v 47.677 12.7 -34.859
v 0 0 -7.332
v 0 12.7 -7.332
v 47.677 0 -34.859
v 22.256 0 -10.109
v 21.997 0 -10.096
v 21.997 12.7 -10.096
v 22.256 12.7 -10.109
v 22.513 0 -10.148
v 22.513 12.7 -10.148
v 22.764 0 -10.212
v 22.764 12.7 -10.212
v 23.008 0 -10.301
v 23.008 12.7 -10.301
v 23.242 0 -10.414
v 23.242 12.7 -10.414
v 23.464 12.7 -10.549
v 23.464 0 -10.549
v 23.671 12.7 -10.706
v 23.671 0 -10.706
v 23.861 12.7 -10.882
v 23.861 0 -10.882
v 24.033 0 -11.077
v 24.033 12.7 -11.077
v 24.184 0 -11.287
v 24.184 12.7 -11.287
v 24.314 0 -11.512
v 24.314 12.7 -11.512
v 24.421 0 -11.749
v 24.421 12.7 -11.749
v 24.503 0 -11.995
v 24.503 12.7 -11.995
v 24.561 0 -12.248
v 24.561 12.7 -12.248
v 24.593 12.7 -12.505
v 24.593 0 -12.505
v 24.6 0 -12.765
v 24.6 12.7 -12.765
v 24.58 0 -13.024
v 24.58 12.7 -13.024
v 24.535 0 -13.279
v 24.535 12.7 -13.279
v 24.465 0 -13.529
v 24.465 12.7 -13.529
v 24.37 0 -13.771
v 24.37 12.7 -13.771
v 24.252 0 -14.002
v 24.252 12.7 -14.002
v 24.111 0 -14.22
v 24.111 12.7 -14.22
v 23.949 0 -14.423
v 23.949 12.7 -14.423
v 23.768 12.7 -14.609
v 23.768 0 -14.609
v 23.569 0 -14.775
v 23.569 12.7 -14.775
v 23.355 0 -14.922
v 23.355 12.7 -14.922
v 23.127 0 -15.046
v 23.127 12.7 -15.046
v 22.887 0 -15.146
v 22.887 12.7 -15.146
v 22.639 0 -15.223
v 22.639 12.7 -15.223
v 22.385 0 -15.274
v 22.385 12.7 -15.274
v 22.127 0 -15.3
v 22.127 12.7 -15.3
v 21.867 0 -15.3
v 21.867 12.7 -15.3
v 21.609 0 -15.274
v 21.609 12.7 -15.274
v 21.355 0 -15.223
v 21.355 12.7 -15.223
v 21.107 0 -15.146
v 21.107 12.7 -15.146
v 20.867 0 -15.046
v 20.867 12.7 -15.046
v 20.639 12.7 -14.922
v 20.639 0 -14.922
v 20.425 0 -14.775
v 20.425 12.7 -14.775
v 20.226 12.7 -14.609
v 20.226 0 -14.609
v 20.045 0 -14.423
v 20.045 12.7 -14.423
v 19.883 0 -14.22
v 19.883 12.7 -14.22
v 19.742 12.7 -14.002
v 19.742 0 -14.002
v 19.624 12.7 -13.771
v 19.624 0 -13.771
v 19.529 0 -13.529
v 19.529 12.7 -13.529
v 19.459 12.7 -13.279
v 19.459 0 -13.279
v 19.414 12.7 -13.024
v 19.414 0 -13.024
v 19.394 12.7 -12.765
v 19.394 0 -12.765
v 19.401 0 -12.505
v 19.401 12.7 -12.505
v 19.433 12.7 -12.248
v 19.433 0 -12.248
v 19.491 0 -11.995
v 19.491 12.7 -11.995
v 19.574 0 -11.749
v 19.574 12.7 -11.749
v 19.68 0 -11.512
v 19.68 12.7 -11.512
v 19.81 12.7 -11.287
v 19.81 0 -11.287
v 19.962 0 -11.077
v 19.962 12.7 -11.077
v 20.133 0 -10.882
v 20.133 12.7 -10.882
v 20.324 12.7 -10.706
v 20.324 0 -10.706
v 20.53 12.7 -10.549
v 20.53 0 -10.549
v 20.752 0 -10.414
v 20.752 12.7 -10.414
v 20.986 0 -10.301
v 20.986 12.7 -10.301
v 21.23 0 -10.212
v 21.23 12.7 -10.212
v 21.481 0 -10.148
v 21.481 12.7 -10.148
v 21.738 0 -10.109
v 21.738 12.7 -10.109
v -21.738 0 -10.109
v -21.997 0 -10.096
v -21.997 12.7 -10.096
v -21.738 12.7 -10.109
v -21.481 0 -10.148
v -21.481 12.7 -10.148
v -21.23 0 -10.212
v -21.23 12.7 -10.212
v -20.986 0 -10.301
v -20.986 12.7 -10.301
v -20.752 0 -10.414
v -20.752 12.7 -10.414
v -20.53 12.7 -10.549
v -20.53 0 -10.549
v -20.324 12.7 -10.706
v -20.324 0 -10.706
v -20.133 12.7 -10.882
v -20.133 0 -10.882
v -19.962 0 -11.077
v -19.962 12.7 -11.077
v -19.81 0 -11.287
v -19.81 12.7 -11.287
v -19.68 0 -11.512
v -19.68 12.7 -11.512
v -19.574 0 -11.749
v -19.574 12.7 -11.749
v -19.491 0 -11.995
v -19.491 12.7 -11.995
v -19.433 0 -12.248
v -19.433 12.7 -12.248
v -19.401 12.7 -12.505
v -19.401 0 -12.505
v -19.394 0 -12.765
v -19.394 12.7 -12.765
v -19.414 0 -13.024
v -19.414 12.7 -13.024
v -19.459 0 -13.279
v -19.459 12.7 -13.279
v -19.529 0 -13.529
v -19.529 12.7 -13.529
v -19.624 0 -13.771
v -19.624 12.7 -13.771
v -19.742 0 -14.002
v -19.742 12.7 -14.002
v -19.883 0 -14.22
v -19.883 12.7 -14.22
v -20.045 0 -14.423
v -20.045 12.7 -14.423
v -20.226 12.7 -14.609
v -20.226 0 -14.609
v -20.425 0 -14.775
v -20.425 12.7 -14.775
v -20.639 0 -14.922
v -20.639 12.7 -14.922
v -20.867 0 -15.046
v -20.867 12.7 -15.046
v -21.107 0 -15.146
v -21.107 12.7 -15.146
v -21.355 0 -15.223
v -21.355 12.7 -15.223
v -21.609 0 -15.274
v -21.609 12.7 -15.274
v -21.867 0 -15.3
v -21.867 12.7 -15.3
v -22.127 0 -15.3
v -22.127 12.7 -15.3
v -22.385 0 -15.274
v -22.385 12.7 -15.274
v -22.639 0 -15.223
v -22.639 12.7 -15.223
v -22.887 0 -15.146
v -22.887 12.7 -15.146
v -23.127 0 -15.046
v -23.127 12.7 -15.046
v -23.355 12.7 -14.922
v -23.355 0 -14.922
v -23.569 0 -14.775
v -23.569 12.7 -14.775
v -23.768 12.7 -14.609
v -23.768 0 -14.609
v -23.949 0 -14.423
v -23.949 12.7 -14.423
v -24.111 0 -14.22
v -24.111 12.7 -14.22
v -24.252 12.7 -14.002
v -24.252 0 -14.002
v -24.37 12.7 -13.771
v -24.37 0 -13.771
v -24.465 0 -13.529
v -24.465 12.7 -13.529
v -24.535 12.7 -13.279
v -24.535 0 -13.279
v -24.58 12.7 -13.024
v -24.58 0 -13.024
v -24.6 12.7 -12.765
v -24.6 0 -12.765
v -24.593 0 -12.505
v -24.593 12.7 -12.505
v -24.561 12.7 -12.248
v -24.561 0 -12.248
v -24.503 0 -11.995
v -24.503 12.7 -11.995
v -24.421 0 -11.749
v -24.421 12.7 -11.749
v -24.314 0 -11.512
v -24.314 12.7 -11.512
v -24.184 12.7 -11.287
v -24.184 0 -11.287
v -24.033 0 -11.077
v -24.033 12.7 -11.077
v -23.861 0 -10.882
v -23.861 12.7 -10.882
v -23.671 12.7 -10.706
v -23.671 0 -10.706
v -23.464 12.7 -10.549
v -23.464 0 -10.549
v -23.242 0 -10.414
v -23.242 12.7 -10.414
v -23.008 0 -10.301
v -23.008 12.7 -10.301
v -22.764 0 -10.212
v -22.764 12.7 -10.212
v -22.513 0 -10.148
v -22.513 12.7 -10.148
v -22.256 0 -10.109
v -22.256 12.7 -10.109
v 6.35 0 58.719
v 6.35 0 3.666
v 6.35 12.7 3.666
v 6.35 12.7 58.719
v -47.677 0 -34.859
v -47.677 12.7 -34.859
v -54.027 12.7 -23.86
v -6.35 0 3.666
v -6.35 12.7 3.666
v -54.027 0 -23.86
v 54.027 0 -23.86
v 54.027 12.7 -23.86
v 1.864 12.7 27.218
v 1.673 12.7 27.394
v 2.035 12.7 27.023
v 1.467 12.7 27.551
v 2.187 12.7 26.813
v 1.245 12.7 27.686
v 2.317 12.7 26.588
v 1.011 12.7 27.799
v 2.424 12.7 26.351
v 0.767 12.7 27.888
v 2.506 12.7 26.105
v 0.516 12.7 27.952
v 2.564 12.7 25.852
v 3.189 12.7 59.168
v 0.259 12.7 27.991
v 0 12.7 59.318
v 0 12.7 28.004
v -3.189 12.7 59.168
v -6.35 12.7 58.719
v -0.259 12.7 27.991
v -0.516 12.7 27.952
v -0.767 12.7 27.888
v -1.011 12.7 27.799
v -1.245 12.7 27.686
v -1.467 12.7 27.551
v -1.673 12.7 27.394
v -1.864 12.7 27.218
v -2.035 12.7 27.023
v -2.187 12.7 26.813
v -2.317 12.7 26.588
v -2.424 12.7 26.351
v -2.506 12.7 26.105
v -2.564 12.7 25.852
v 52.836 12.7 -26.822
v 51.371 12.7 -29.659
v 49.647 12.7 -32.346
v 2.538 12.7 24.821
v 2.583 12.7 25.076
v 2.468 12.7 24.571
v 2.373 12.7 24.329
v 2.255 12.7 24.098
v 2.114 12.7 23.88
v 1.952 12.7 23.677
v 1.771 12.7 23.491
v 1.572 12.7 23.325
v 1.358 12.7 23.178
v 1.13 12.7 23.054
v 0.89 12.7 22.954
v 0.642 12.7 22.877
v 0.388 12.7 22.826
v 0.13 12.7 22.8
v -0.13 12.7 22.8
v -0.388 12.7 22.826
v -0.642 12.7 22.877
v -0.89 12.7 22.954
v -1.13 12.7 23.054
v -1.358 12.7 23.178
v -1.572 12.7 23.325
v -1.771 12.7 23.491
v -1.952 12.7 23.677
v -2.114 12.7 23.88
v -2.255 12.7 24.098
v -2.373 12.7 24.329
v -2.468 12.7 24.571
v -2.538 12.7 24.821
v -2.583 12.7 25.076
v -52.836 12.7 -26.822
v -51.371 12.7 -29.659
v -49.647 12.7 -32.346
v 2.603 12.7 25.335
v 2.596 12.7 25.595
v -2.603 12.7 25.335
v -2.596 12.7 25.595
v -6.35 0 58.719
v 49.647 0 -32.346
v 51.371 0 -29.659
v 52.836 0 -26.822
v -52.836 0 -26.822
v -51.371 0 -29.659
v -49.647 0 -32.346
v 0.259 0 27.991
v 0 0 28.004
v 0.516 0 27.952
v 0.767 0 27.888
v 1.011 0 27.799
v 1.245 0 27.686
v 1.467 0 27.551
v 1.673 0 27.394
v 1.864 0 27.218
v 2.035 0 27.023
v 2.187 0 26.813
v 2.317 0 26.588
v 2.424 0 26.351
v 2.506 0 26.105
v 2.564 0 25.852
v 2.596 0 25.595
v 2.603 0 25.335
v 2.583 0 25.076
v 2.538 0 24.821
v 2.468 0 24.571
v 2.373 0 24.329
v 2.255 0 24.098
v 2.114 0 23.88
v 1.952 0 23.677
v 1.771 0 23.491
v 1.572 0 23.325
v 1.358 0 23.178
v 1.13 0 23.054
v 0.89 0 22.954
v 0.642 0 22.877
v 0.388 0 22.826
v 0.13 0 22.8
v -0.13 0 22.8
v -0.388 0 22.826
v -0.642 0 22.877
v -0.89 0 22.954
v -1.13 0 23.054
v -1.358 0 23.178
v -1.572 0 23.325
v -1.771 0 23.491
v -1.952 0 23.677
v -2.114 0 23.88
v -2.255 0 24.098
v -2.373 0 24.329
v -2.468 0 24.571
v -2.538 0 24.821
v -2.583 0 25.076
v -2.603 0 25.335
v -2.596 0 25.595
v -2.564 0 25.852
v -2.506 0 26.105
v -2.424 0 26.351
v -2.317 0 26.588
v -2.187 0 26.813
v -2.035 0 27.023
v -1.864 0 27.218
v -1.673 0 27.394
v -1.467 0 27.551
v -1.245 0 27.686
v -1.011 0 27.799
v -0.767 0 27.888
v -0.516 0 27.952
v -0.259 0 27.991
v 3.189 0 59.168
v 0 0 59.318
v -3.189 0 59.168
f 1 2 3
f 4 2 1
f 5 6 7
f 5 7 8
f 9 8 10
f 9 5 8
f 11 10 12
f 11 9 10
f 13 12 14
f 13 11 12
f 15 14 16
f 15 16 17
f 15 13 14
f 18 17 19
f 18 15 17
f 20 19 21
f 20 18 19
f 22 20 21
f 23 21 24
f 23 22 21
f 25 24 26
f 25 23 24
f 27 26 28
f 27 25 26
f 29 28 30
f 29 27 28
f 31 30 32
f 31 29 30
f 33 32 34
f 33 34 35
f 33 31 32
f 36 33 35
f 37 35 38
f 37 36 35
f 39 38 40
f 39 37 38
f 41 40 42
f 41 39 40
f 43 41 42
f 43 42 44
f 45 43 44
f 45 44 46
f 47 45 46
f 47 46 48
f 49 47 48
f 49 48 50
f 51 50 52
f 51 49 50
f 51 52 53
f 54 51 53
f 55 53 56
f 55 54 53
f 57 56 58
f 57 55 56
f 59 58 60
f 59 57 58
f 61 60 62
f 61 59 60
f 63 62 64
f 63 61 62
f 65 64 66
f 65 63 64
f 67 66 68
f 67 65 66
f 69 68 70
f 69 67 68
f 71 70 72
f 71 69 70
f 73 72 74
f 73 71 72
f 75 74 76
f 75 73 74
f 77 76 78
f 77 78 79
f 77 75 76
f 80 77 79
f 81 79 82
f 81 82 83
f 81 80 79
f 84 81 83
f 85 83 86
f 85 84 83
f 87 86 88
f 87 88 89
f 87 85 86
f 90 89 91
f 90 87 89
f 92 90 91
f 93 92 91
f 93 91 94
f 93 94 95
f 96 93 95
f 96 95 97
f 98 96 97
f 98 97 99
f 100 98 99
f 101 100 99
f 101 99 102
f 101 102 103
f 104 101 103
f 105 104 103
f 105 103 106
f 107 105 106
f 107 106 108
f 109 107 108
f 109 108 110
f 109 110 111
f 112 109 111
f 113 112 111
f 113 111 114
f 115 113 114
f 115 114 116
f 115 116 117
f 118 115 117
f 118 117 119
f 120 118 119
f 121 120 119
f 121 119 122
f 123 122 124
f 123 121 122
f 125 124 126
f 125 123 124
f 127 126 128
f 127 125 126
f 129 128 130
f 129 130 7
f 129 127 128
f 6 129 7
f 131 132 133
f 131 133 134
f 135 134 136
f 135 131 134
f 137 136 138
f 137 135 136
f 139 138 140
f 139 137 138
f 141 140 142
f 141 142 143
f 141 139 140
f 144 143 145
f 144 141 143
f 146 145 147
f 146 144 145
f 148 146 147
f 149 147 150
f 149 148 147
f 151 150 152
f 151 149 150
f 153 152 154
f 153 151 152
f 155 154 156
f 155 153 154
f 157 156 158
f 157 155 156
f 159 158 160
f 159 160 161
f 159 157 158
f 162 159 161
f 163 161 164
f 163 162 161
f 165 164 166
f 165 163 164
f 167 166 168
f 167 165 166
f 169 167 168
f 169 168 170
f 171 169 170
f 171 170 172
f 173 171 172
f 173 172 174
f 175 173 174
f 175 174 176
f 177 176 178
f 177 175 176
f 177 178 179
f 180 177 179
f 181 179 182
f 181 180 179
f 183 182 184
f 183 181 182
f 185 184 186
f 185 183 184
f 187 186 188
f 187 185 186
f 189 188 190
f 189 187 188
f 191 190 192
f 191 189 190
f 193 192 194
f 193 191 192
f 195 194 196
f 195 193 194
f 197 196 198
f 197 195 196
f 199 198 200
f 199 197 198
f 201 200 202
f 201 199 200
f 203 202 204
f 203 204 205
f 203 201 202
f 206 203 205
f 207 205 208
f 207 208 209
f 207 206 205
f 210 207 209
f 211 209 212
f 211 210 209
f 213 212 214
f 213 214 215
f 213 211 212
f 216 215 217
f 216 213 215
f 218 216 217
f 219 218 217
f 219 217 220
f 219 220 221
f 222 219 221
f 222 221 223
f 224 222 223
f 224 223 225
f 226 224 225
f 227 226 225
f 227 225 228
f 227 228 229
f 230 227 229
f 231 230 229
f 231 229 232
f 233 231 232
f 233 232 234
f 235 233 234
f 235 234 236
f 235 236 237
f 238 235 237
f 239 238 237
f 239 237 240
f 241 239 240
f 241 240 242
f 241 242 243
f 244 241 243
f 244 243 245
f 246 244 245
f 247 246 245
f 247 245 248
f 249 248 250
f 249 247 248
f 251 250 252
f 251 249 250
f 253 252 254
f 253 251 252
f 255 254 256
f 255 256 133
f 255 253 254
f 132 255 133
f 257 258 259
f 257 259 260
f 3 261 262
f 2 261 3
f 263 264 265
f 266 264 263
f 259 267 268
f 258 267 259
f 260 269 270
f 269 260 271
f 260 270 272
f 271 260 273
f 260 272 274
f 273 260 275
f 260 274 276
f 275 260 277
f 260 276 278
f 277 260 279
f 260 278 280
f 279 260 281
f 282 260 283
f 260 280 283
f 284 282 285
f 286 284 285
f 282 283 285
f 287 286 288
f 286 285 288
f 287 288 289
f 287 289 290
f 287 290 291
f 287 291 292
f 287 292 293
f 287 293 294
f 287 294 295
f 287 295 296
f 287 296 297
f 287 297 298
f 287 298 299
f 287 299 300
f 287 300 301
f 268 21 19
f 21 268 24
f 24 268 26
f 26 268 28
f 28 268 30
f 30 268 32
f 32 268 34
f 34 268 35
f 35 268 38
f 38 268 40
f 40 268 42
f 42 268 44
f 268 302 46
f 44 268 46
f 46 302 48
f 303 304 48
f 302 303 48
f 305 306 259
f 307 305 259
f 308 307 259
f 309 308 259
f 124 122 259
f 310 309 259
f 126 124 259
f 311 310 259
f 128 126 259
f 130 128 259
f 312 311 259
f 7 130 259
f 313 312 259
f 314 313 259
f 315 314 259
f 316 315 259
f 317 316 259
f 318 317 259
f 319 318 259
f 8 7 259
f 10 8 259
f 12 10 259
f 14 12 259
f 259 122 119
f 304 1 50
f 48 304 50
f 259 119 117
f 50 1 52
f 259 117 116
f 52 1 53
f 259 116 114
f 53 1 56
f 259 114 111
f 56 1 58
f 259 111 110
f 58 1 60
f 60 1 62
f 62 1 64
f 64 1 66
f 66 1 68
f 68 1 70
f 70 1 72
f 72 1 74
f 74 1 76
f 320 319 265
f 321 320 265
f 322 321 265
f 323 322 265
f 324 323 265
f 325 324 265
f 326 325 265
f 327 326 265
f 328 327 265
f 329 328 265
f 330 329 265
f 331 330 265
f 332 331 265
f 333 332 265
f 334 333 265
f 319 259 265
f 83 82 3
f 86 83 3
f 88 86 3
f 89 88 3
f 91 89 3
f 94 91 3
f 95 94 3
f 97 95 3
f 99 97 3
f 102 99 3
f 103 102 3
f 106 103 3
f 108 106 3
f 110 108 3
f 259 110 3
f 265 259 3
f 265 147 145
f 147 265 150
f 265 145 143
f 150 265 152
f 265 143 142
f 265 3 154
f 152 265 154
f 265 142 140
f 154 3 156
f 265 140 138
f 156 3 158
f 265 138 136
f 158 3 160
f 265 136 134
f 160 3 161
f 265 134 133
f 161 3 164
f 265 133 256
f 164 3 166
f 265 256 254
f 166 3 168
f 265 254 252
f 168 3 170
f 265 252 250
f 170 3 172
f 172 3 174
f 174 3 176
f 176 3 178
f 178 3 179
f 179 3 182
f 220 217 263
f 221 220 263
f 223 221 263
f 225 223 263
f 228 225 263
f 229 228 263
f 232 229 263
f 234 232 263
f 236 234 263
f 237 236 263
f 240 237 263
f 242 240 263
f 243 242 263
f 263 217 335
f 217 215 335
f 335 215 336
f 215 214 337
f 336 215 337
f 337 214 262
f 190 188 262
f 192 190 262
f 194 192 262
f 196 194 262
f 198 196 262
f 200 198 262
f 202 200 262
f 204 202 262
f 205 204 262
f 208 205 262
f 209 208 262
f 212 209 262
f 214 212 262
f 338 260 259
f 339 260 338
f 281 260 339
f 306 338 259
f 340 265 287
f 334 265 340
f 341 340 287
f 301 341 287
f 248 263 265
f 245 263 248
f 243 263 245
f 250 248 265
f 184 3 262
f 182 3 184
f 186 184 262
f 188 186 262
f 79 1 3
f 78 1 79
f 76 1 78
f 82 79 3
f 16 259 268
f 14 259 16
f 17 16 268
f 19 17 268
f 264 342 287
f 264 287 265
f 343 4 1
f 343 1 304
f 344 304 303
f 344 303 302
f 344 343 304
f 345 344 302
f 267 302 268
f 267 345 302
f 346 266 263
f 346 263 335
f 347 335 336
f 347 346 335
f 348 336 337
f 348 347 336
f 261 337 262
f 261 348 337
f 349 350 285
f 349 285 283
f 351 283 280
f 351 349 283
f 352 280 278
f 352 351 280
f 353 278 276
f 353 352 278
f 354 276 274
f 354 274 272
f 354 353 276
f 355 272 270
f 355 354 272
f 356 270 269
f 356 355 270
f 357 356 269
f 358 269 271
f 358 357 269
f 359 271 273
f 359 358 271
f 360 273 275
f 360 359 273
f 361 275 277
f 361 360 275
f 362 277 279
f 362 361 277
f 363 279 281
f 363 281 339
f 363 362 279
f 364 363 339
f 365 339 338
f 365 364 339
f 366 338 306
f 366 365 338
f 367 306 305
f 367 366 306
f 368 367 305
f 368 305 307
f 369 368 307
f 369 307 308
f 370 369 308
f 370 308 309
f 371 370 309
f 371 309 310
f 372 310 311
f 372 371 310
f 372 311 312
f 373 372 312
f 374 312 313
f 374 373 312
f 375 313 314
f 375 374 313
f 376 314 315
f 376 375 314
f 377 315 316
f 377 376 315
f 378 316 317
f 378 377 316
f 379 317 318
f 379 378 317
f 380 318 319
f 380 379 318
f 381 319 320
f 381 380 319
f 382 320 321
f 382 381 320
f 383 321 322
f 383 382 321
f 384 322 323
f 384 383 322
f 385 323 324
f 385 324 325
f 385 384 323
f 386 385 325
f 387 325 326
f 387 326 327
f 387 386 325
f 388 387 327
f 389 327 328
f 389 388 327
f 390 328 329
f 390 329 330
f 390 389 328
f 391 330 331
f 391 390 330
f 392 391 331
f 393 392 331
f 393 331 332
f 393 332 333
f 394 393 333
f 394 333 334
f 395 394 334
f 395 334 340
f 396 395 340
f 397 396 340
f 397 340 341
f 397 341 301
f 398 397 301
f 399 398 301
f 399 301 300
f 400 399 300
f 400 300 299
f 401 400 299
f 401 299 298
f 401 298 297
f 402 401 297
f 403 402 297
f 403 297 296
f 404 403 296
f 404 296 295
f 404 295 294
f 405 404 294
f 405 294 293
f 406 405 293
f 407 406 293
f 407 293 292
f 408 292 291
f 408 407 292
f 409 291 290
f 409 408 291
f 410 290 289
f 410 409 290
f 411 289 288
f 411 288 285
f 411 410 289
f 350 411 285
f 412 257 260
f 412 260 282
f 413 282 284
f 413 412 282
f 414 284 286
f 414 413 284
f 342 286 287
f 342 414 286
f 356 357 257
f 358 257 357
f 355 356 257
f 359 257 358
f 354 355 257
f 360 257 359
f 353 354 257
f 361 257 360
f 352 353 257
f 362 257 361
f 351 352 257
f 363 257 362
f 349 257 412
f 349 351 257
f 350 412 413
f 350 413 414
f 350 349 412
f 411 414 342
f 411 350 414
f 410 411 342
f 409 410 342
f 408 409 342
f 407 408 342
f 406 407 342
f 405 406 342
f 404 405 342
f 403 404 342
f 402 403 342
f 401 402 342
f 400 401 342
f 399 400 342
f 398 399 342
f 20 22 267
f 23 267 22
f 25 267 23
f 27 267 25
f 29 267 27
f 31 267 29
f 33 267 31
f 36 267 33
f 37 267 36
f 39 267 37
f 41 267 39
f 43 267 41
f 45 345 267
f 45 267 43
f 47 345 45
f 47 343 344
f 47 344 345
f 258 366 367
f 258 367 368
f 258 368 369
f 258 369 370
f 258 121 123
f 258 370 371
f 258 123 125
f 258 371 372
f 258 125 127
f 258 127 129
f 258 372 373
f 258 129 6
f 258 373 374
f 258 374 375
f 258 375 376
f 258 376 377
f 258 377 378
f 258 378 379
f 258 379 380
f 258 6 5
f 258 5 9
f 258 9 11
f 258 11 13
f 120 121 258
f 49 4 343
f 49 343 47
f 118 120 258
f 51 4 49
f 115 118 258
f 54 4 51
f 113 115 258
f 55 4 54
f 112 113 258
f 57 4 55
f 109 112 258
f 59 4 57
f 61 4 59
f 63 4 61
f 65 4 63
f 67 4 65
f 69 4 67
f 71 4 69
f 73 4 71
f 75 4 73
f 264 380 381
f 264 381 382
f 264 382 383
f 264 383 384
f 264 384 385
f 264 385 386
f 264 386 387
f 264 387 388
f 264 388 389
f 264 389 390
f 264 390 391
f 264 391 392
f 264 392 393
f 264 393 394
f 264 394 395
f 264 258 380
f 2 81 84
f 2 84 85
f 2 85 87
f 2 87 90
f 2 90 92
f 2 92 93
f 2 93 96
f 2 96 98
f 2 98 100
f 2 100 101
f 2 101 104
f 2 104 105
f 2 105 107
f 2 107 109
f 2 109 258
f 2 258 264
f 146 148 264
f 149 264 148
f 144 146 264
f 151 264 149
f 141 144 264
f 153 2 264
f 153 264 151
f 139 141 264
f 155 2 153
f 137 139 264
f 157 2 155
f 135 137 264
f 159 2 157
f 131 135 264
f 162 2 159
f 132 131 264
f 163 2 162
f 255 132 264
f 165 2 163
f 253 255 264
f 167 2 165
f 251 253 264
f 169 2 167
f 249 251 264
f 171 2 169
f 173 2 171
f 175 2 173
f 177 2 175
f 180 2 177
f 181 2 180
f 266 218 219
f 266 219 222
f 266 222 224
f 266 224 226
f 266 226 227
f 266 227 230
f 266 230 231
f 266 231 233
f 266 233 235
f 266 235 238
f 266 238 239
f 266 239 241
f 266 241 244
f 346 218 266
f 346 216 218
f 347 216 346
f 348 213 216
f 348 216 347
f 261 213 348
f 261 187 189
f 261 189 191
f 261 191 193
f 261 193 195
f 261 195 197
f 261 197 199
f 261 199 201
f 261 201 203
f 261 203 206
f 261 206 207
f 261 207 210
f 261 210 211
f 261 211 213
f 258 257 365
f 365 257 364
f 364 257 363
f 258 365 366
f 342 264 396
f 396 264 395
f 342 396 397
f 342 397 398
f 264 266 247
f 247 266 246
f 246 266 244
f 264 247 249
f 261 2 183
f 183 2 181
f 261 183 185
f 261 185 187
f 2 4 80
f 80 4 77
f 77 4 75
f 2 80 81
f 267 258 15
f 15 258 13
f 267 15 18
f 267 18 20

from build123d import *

# Parameters (mm, degrees)
SKETCH1_R           = 2.6035
BOSS_EXTRUDE1_DEPTH = 12.7


with BuildPart() as part:
    # Sketch1 → Boss-Extrude1 (new body)
    with BuildSketch(Plane(origin=(0, 0, 0), x_dir=(1, 0, 0), z_dir=(0, 1, 0))):
        with BuildLine():
            Line((6.35, -3.666174209), (6.35, -58.718791294))
            ThreePointArc((6.35, -58.718791294), (0, -59.31849574), (-6.35, -58.718791294))
            Line((-6.35, -58.718791294), (-6.35, -3.666174209))
            Line((-6.35, -3.666174209), (-54.02696494, 23.860134333))
            ThreePointArc((-54.02696494, 23.860134333), (-51.371324225, 29.65924787), (-47.67696494, 34.858656961))
            Line((-47.67696494, 34.858656961), (0, 7.332348419))
            Line((0, 7.332348419), (47.67696494, 34.858656961))
            ThreePointArc((47.67696494, 34.858656961), (51.371324225, 29.65924787), (54.02696494, 23.860134333))
            Line((54.02696494, 23.860134333), (6.35, -3.666174209))
        make_face()
        with Locations(Location((0, -25.4, 0), (0, 0, 270))):
            Circle(SKETCH1_R, mode=Mode.SUBTRACT)
        with Locations(Location((-21.997045256, 12.7, 0), (0, 0, 270))):
            Circle(SKETCH1_R, mode=Mode.SUBTRACT)
        with Locations(Location((21.997045256, 12.7, 0), (0, 0, 270))):
            Circle(SKETCH1_R, mode=Mode.SUBTRACT)
    extrude(amount=BOSS_EXTRUDE1_DEPTH)


solid = part.part
